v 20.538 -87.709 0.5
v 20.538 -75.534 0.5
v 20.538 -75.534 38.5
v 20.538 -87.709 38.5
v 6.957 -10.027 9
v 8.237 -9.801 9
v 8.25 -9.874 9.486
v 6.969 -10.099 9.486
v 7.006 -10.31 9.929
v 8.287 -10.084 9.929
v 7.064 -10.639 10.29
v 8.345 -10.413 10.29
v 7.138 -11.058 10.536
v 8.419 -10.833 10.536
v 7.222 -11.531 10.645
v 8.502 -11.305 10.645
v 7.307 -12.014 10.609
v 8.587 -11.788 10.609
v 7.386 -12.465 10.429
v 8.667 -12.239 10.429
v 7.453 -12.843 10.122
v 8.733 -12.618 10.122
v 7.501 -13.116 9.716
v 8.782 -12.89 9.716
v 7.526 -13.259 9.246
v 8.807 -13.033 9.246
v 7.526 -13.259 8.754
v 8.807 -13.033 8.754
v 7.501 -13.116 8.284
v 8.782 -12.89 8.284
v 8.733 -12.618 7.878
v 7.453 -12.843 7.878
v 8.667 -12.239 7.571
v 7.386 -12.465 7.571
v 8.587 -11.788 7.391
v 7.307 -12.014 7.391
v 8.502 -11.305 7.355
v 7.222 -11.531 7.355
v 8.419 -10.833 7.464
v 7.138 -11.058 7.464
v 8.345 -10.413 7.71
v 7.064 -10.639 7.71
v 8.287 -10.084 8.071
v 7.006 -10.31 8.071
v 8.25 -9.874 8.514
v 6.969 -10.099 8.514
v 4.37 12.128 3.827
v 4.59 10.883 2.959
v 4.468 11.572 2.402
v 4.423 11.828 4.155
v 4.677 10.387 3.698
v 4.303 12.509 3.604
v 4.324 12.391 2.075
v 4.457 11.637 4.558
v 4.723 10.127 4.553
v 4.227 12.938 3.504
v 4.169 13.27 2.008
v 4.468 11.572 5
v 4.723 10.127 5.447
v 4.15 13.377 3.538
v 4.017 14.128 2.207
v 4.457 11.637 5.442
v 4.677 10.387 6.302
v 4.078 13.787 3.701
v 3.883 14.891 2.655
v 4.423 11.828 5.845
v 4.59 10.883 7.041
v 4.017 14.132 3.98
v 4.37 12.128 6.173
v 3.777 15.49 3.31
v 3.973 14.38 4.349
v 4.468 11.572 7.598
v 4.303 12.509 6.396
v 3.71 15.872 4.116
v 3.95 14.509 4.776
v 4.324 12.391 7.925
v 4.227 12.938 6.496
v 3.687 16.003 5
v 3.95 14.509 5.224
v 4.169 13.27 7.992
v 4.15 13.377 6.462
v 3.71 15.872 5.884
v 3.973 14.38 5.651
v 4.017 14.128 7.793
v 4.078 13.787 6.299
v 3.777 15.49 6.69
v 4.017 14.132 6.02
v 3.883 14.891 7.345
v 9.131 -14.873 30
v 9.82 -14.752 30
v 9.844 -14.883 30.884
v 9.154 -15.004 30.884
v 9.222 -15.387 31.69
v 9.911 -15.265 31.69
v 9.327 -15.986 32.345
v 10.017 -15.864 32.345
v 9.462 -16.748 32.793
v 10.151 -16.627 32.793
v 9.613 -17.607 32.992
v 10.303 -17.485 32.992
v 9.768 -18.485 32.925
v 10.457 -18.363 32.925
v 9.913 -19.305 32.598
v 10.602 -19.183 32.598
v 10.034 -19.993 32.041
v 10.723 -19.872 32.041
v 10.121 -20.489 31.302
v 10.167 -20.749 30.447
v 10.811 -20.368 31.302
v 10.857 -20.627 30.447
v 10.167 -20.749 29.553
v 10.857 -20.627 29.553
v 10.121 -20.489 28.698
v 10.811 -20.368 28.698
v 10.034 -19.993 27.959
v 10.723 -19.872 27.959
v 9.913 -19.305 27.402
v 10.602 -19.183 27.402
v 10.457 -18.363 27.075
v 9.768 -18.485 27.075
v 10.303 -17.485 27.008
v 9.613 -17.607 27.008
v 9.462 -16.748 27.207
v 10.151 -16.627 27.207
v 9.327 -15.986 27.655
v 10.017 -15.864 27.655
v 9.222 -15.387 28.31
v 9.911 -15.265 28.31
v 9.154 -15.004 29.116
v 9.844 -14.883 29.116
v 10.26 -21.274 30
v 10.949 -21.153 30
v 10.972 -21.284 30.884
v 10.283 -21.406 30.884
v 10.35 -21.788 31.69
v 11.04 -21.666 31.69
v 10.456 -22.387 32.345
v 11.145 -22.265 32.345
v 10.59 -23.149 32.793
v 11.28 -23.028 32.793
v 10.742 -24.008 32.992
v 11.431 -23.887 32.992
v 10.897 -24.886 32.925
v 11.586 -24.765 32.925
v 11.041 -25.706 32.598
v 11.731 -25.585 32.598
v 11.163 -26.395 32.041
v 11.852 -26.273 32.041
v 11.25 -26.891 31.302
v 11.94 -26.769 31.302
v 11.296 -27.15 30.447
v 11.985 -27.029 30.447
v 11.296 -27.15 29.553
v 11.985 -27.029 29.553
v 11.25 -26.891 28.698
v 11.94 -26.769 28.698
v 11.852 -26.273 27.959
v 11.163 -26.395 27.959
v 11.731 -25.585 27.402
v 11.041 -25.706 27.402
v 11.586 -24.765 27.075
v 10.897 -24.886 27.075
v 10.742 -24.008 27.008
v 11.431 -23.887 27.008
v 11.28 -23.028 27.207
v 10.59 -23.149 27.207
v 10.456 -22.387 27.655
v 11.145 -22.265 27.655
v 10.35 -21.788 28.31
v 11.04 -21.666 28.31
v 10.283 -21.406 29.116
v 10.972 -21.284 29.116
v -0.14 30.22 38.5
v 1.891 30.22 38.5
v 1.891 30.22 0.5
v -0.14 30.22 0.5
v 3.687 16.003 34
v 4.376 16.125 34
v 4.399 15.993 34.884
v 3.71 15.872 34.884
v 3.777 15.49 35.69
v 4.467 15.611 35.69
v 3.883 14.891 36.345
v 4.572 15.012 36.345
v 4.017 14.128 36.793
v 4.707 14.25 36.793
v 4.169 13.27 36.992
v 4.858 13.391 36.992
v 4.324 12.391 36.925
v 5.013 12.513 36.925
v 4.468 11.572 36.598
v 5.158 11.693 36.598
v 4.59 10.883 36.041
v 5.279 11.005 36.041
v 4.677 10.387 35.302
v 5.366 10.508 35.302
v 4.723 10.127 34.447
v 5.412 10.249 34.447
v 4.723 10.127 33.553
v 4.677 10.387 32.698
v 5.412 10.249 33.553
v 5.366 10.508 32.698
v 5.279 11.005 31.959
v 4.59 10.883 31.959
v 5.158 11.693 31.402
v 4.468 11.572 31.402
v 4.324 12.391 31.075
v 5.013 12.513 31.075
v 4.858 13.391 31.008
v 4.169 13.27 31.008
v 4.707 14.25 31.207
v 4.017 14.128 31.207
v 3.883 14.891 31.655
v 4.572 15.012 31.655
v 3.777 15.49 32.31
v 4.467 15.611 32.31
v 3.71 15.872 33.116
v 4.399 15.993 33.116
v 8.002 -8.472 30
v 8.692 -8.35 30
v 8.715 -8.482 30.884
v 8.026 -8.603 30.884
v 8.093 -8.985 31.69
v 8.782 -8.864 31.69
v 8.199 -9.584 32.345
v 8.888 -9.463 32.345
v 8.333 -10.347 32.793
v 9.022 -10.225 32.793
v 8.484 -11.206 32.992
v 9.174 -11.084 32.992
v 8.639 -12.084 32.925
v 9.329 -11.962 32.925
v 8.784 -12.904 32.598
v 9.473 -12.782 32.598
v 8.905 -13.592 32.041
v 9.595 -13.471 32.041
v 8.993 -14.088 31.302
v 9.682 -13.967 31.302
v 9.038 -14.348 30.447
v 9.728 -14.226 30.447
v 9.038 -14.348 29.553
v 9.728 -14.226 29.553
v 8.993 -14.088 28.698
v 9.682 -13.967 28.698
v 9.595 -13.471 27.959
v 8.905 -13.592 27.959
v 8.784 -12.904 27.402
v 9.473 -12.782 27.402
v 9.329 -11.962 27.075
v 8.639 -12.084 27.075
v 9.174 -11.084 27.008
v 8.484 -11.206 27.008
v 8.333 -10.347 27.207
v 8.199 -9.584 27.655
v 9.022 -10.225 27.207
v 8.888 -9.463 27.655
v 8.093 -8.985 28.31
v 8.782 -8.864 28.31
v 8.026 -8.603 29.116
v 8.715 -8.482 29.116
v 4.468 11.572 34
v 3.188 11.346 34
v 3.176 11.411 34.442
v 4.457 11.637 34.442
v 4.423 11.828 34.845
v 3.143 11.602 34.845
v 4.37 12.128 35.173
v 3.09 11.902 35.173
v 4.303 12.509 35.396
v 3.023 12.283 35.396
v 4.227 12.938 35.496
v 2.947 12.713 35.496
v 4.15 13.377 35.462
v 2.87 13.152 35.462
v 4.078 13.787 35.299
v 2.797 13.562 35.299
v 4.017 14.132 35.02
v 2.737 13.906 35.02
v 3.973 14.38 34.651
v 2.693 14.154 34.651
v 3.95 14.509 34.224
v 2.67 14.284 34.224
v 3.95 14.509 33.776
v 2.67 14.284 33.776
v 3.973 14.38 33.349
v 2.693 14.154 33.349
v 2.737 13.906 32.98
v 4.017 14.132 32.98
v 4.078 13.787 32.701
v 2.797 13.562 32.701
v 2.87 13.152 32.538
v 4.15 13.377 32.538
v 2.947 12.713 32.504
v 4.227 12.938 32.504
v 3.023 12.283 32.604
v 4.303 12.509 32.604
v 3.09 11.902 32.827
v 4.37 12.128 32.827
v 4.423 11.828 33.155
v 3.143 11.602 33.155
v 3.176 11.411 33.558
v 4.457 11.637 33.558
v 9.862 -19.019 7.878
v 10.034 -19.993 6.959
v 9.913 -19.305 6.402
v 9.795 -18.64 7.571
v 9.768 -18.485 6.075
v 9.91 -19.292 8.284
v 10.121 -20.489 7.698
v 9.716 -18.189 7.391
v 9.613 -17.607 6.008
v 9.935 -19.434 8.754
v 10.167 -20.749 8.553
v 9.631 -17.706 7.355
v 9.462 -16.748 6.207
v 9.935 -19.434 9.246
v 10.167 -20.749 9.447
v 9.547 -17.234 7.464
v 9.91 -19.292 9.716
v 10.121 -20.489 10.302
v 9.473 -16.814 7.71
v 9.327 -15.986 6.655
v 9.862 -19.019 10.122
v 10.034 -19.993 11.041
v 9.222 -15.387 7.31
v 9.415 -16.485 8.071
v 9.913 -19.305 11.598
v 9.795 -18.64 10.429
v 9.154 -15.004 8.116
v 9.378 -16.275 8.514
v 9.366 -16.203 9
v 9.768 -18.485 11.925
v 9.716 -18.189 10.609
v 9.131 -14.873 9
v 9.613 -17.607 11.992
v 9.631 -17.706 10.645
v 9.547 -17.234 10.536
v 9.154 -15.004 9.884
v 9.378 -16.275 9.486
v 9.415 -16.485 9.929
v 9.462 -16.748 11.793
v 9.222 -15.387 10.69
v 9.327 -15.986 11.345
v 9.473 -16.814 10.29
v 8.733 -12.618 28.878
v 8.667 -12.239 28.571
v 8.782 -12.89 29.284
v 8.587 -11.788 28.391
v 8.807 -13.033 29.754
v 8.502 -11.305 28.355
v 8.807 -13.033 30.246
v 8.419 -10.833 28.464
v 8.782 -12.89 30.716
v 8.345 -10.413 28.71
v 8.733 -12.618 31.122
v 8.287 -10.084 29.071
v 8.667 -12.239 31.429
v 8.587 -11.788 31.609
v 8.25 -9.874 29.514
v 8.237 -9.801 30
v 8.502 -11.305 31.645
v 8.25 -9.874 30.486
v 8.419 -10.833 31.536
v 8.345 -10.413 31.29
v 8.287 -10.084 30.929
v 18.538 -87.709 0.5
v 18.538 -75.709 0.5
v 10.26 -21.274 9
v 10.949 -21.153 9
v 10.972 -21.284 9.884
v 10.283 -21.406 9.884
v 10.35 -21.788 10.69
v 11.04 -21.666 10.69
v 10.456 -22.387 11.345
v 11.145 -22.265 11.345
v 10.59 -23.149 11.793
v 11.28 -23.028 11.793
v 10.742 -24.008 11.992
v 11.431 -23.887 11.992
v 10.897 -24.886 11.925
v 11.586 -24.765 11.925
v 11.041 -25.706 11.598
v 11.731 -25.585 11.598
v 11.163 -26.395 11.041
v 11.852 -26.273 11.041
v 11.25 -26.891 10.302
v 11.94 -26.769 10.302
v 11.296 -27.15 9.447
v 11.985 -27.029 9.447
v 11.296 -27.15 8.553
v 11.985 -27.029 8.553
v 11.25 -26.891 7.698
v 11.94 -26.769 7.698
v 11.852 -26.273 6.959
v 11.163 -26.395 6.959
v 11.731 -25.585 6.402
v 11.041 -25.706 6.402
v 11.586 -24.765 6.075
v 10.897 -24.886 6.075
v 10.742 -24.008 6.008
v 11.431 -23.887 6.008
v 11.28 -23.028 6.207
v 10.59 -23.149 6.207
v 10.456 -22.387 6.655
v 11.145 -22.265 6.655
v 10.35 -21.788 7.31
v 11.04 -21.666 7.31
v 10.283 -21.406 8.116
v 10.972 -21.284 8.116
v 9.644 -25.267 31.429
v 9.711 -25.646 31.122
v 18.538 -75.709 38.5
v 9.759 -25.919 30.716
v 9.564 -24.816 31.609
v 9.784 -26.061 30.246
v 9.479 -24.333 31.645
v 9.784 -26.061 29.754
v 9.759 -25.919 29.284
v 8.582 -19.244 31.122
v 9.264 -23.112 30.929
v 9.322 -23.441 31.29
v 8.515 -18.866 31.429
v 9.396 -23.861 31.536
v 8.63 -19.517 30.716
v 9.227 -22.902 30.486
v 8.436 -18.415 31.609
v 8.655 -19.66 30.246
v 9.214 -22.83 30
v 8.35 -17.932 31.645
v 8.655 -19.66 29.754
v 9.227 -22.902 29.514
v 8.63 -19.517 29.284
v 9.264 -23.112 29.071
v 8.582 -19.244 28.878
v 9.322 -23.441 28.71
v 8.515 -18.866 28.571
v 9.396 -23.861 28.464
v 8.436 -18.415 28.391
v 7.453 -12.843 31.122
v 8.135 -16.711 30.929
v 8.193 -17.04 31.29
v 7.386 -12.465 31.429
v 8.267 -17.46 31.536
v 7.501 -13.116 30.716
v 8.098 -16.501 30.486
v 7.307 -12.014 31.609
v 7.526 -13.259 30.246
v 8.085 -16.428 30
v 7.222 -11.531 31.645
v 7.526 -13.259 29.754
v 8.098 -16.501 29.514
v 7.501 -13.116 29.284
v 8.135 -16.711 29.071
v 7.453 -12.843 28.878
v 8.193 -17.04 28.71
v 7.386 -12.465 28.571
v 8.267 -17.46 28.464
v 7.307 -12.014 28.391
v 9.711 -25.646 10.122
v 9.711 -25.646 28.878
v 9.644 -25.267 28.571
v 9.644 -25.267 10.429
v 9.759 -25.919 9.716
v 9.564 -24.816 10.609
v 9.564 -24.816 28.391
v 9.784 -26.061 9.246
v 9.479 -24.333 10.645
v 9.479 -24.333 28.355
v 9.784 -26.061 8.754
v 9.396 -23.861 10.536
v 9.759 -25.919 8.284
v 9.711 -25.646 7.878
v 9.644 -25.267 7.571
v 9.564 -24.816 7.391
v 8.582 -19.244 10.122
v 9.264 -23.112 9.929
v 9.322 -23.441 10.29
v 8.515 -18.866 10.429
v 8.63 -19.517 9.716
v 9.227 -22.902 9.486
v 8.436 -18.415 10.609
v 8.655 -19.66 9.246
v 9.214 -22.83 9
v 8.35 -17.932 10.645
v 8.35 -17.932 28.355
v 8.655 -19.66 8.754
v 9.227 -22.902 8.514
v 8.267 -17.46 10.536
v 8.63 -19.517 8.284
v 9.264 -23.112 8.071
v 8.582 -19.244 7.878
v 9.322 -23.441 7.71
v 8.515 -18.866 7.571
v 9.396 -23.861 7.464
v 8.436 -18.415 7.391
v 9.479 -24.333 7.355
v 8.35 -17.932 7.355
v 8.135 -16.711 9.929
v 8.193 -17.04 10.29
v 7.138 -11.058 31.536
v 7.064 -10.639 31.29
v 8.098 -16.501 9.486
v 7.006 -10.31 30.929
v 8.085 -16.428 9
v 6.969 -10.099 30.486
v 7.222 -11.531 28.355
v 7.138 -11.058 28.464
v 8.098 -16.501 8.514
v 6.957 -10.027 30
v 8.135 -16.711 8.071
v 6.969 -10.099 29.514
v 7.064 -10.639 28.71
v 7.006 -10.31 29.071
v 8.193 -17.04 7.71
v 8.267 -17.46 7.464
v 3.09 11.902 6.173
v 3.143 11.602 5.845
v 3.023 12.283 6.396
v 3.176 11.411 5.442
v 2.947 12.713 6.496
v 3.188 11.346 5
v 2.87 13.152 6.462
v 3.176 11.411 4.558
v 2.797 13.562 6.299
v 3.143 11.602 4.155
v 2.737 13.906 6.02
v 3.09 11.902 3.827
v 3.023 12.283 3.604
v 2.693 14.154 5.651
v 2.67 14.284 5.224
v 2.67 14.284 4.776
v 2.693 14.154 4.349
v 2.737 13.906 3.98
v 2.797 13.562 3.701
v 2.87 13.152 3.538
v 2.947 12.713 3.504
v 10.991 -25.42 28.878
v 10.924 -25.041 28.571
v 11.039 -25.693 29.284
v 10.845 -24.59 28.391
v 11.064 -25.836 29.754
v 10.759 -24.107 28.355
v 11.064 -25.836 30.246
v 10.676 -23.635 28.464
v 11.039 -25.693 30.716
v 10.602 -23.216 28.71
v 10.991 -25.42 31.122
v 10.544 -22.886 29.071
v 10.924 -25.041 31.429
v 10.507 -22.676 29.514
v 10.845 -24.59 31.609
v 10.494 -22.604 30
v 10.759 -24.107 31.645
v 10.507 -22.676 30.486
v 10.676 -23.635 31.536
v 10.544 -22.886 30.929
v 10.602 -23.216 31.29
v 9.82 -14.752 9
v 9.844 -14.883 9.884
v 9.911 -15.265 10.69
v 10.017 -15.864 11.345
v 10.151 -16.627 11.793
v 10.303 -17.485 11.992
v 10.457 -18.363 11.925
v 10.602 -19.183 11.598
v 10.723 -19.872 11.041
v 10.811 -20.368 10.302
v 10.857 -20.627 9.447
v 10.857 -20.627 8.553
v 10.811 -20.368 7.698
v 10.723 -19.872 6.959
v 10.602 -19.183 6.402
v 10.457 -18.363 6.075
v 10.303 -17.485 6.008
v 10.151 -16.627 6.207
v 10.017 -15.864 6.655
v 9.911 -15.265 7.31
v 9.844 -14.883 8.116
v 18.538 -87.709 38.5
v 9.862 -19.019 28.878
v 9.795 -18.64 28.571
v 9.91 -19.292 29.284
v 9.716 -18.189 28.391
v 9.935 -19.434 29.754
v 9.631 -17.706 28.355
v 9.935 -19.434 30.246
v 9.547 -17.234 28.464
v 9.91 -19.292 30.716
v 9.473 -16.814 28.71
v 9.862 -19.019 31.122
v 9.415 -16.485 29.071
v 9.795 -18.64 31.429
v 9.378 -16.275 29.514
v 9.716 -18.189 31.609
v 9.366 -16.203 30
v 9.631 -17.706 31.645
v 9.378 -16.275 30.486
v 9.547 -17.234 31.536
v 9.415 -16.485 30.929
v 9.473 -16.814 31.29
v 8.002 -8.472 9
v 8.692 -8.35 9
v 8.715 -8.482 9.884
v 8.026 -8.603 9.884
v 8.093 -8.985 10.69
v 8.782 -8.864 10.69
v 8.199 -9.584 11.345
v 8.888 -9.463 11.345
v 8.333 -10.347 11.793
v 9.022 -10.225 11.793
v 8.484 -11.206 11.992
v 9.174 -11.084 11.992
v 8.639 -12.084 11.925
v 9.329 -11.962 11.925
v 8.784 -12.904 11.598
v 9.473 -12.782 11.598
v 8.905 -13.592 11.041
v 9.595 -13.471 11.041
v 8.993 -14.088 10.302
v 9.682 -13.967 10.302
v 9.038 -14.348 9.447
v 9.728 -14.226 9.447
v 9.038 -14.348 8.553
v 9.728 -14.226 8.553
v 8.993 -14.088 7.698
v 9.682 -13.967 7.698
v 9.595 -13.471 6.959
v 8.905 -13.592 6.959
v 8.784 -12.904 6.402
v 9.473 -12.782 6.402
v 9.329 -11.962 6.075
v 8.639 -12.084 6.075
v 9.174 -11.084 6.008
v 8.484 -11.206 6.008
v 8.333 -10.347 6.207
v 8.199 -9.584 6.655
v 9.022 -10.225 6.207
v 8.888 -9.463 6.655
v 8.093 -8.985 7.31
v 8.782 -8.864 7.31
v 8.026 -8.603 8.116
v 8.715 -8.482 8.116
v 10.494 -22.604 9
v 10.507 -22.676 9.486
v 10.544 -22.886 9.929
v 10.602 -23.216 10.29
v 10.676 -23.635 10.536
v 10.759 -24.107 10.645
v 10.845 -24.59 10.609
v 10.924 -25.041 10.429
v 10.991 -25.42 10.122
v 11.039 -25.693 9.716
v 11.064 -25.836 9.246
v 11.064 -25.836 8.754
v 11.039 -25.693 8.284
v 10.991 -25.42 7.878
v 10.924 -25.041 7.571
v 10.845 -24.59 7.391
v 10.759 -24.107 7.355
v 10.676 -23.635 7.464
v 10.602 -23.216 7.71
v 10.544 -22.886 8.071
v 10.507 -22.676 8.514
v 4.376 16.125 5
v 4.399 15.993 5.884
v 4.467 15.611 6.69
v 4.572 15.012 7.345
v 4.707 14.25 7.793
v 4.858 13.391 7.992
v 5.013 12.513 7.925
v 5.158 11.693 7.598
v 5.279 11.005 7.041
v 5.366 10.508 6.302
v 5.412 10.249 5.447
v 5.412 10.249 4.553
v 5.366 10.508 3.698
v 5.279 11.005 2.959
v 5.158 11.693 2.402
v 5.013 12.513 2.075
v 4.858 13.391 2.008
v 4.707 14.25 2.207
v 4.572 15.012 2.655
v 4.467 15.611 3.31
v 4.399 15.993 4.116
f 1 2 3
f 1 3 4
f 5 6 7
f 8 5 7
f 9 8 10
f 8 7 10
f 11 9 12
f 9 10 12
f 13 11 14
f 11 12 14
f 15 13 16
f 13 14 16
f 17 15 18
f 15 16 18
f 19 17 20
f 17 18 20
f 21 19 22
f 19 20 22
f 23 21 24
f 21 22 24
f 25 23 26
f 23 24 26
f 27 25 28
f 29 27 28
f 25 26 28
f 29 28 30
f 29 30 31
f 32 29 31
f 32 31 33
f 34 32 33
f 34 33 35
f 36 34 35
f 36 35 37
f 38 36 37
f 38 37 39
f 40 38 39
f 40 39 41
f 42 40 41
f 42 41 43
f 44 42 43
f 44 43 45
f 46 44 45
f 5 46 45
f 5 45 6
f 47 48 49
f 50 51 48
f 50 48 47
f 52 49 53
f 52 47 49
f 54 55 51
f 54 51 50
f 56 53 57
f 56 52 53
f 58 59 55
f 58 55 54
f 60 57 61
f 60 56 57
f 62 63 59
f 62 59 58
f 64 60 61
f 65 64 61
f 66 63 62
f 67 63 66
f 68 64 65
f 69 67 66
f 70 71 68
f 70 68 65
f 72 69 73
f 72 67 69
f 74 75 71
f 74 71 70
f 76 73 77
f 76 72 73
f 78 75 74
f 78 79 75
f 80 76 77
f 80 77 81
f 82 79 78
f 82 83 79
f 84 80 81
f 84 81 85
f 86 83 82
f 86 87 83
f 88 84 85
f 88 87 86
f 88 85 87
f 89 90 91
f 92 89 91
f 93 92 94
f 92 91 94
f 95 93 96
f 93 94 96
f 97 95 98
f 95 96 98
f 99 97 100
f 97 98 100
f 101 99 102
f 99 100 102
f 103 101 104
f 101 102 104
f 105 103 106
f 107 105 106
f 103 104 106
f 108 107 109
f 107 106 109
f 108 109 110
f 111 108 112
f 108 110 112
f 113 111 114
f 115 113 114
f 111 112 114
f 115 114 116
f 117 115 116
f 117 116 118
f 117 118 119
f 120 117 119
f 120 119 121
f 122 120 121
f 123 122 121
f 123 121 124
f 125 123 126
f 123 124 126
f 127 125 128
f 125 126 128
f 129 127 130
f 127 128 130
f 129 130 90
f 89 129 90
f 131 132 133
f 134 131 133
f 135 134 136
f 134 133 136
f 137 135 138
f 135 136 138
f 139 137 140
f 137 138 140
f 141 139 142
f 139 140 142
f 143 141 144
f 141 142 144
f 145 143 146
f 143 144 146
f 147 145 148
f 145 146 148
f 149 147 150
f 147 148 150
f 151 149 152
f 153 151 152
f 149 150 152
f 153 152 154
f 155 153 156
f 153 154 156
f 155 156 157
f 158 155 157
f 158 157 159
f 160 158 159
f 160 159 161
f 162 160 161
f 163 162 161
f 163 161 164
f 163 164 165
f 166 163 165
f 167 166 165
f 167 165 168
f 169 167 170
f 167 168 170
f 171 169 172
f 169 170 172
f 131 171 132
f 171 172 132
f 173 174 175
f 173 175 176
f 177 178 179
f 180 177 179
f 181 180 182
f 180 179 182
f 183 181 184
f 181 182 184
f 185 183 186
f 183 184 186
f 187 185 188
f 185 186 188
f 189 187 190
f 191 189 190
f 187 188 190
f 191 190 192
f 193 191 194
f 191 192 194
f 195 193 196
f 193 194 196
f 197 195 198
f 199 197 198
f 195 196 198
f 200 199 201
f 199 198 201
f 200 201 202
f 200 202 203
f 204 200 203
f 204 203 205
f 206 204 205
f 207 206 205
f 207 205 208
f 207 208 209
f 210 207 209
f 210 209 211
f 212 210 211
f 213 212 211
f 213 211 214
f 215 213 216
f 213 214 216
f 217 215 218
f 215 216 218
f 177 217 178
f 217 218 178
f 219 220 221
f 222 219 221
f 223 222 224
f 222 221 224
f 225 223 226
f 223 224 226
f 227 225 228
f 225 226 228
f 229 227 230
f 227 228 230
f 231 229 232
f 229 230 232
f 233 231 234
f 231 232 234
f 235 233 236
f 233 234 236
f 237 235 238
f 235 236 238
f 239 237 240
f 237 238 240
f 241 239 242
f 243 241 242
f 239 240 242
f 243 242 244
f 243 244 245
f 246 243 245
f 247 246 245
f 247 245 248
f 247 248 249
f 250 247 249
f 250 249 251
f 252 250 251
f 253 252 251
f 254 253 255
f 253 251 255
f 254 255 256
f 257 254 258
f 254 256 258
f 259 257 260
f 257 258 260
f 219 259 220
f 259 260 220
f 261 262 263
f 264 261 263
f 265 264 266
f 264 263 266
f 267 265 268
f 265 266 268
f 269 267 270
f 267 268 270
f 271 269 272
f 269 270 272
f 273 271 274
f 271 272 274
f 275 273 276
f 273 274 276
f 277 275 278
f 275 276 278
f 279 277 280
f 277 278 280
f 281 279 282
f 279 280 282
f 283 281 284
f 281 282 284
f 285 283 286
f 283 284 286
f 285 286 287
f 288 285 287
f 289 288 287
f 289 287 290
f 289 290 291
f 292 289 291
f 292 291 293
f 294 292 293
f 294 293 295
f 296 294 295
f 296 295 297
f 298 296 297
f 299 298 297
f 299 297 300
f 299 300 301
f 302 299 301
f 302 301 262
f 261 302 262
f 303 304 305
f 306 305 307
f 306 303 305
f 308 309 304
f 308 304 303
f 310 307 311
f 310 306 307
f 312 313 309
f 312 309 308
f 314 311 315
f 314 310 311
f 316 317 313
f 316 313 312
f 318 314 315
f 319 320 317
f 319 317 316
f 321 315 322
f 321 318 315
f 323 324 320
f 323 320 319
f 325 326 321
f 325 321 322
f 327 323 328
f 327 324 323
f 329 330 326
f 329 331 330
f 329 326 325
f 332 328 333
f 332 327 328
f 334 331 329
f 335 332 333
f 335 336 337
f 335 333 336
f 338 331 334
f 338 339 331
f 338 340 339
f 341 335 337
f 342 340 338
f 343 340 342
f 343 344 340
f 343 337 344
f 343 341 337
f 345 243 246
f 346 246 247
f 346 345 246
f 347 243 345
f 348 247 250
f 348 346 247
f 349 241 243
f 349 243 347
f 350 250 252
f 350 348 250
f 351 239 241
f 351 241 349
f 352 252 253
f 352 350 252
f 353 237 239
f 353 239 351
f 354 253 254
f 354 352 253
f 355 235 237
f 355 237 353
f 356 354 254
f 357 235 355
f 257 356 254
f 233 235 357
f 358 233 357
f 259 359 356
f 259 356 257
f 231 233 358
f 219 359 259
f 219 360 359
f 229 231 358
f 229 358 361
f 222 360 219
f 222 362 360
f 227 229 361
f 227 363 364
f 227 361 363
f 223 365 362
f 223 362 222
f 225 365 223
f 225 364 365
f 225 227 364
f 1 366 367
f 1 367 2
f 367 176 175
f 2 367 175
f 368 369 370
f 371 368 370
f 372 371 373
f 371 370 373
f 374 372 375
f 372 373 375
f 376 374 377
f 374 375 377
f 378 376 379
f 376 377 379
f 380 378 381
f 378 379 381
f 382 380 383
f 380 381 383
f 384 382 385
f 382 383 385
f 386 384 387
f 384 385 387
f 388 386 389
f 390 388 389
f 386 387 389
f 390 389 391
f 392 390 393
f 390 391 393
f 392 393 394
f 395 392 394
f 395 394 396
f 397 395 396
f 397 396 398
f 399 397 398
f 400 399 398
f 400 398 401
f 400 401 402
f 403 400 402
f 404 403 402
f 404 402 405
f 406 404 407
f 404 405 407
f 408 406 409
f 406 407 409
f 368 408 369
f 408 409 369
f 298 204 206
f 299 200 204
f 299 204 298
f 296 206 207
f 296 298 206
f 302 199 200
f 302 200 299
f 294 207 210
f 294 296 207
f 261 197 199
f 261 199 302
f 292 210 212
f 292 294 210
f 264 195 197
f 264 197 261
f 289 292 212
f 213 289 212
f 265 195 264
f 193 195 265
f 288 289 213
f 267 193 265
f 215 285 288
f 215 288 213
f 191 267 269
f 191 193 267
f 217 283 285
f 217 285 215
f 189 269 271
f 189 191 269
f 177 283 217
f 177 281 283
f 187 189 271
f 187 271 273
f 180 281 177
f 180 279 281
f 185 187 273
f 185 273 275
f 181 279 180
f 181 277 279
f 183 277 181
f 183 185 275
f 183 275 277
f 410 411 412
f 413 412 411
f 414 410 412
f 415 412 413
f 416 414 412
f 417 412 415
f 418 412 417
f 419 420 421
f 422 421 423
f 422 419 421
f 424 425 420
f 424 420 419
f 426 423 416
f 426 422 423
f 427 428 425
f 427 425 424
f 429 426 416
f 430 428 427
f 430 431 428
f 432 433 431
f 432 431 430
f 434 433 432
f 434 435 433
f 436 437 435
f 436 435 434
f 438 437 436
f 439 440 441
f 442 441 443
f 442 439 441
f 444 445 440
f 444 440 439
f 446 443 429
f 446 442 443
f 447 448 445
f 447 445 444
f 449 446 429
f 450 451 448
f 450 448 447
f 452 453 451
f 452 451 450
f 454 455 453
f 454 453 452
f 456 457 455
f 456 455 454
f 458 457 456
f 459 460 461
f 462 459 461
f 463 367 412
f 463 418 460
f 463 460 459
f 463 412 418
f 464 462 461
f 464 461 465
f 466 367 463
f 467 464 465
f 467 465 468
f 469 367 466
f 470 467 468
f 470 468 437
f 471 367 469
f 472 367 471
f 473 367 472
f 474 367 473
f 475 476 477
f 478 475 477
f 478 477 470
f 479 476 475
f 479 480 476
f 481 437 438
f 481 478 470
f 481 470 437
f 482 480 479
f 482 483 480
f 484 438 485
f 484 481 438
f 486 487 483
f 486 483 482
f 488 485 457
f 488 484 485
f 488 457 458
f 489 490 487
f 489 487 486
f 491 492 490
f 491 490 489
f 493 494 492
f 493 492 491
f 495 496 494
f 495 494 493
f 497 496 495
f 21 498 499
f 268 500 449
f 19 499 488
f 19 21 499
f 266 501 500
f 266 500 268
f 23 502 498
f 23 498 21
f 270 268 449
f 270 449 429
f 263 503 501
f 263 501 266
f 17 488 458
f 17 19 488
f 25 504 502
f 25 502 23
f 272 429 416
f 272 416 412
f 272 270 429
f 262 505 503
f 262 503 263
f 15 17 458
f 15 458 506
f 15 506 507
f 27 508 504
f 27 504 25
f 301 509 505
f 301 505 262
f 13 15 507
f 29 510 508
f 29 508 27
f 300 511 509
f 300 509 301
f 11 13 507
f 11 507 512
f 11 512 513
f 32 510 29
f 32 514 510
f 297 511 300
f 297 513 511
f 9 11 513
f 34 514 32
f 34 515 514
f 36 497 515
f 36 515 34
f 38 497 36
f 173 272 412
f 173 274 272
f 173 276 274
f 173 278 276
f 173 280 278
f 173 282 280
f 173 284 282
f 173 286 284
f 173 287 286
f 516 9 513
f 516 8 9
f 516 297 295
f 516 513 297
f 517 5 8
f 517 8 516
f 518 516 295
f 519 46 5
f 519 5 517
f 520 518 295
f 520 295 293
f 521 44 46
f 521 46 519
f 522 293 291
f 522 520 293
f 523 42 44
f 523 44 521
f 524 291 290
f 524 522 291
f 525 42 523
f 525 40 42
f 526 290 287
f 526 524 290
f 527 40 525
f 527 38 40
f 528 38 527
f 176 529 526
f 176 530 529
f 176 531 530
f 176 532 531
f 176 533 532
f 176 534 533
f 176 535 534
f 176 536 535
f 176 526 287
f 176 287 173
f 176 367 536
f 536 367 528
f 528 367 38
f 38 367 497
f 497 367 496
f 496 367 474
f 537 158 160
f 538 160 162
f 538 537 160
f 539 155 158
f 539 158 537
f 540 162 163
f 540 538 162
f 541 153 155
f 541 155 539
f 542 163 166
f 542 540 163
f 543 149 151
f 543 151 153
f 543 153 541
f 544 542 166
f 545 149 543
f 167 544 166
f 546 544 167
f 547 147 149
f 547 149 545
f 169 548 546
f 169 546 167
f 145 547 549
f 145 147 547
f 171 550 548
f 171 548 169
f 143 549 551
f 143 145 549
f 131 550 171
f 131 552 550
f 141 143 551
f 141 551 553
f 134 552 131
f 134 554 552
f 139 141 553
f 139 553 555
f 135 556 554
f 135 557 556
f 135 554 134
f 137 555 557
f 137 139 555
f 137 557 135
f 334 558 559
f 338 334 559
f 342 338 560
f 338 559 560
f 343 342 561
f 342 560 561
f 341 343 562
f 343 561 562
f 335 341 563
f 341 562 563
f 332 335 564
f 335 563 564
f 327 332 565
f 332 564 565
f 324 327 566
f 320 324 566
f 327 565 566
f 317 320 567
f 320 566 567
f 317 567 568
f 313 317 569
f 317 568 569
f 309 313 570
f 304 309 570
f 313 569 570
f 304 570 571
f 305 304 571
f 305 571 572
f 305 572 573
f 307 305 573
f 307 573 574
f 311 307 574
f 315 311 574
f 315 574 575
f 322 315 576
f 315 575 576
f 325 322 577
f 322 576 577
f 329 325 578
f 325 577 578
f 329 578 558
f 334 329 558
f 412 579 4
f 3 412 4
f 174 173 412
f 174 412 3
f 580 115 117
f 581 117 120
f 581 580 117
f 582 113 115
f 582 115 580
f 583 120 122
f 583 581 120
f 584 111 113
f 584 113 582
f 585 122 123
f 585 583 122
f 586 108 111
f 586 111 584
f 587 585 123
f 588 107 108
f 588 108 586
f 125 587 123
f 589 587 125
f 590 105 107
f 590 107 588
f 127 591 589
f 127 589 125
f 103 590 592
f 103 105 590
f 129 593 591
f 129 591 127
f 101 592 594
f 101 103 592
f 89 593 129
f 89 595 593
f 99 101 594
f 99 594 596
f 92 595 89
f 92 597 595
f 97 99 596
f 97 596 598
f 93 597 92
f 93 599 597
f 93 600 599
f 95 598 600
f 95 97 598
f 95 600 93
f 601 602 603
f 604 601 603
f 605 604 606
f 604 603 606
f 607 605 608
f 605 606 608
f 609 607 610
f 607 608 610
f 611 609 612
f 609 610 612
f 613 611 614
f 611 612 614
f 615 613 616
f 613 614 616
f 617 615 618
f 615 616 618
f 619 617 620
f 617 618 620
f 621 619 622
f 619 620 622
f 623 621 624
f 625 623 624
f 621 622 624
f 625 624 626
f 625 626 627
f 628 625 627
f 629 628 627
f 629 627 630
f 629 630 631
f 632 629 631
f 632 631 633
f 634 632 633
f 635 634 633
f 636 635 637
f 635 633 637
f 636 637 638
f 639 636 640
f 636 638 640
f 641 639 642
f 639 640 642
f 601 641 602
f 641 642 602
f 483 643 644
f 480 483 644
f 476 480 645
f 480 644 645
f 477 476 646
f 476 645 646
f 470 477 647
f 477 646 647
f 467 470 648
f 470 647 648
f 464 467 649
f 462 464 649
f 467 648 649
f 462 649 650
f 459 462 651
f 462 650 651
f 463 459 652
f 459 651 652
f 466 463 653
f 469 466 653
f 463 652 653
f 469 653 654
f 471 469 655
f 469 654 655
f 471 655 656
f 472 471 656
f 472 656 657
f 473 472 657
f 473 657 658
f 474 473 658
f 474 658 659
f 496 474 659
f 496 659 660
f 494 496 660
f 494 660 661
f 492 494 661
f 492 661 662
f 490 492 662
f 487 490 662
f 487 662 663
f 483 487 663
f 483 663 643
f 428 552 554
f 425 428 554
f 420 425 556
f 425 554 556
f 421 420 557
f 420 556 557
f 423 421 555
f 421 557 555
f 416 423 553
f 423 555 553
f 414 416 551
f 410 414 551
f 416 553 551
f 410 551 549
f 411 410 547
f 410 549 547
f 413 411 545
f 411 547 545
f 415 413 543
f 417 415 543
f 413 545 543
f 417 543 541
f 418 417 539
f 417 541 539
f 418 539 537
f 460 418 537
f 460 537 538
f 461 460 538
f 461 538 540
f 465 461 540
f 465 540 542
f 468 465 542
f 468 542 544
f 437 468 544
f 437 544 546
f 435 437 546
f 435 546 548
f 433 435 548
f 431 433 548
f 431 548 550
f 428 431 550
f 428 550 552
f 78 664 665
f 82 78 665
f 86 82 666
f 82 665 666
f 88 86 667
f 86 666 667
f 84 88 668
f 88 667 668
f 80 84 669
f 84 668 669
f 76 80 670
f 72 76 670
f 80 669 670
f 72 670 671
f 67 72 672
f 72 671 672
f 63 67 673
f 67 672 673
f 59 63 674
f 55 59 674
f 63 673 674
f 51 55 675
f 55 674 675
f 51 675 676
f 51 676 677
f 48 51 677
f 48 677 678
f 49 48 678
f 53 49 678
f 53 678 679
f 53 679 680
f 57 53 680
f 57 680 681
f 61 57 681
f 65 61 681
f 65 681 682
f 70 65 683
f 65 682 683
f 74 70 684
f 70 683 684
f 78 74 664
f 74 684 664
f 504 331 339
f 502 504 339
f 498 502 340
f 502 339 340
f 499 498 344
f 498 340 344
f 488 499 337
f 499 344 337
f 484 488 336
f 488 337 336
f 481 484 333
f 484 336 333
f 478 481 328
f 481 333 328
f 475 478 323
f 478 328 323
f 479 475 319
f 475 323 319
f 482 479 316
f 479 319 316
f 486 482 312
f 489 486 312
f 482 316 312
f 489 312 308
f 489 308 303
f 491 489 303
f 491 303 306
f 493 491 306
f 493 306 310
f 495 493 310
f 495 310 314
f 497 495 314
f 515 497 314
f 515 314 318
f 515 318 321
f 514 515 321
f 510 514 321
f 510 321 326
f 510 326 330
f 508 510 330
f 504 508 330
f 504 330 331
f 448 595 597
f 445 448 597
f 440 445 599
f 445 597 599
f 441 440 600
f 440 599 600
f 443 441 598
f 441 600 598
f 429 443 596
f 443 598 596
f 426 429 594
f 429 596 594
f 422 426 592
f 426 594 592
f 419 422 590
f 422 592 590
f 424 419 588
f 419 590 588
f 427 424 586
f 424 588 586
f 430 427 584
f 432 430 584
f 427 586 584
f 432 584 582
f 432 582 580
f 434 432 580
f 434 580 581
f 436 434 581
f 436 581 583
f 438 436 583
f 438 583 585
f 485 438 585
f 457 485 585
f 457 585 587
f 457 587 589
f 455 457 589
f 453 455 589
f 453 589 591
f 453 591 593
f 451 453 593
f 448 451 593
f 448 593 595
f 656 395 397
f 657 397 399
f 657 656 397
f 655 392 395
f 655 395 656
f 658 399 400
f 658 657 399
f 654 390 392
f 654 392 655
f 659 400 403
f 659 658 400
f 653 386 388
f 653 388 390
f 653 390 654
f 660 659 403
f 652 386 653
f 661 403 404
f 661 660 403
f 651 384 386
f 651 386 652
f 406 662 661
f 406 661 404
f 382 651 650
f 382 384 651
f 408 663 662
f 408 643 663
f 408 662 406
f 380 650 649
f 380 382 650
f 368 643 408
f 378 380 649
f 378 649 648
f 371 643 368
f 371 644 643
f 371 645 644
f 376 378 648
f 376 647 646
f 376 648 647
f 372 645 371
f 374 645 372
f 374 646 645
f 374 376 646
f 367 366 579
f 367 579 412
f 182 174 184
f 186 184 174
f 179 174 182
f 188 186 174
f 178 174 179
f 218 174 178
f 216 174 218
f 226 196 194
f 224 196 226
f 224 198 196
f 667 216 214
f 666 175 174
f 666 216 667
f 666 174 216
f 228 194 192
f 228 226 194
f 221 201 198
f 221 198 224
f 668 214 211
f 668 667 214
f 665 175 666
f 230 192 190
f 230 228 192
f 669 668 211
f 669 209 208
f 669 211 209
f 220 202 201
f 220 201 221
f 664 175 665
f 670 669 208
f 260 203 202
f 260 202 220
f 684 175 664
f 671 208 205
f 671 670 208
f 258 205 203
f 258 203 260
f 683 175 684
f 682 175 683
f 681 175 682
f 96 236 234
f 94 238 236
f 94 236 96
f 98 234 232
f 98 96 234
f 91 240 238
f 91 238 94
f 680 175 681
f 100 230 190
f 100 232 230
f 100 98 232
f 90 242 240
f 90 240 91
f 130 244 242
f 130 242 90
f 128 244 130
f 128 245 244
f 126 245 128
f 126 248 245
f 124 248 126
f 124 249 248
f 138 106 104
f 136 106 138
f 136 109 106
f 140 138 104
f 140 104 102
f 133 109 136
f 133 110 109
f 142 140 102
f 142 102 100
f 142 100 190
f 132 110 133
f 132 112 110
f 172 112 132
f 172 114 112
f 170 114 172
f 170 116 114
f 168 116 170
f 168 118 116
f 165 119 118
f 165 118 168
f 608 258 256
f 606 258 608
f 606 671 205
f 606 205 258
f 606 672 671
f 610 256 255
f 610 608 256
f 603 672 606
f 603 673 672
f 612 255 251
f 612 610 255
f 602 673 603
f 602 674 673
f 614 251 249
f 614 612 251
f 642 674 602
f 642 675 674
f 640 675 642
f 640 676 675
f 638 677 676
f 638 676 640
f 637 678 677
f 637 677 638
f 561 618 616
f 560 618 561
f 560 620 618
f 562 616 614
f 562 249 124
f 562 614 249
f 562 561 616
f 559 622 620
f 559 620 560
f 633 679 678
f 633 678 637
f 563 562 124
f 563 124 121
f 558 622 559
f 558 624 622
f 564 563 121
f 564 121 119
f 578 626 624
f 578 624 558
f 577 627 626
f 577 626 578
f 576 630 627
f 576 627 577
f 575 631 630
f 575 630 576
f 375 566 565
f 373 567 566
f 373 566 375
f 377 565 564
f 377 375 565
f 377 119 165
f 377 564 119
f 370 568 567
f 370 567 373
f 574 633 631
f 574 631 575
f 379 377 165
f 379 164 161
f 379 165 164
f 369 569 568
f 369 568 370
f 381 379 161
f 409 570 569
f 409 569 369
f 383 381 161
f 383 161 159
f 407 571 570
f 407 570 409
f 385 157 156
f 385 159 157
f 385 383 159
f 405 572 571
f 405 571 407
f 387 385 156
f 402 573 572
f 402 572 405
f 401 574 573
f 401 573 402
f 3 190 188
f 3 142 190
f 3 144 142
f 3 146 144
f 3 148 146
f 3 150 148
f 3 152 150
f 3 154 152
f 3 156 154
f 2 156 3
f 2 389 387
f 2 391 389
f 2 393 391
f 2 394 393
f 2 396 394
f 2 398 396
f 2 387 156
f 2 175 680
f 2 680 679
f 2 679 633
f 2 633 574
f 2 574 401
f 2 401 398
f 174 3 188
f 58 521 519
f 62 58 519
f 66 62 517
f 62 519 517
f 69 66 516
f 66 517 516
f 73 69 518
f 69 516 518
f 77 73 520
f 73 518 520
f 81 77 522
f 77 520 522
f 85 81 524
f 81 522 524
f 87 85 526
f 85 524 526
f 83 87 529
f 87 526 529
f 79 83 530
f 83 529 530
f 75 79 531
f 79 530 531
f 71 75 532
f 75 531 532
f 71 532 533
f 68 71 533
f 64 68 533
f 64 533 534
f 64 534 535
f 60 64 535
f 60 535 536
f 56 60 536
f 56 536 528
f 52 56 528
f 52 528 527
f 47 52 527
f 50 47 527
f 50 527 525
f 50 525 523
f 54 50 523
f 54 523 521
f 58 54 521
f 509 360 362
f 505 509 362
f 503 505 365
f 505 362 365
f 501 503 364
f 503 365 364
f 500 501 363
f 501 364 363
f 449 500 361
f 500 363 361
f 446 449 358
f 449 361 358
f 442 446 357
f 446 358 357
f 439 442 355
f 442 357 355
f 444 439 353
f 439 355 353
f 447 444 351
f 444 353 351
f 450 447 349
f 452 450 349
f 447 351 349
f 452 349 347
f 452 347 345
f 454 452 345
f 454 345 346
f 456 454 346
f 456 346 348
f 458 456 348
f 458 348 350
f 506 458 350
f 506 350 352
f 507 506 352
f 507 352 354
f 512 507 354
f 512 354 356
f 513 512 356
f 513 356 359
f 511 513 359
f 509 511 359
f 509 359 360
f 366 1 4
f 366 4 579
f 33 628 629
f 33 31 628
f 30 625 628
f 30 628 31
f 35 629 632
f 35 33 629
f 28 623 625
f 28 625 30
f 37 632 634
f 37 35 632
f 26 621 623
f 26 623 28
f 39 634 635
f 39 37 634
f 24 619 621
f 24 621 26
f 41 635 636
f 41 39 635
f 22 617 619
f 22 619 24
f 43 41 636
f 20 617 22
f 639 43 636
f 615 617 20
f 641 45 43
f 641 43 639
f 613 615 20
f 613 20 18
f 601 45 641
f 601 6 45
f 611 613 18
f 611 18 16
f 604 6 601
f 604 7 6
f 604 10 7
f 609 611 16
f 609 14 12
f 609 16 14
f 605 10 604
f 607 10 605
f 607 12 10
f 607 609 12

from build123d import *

# Parameters (mm, degrees)
EXTRUDE_1_DEPTH     = 39
SKETCH_7_R          = 1.65
CUT_EXTRUDE_1_DEPTH = 10
SKETCH_11_R         = 1.5
CUT_EXTRUDE_2_DEPTH = 10
SKETCH_12_W         = 29.009042243
SKETCH_12_H         = 10
CUT_EXTRUDE_3_DEPTH = 40
SKETCH_14_R         = 3
CUT_EXTRUDE_4_DEPTH = 0.7
SKETCH_17_W         = 22.396032982
SKETCH_17_H         = 19.376343142
CUT_EXTRUDE_5_DEPTH = 48
SKETCH_18_W         = 48.955276493
SKETCH_18_H         = 0.5
SKETCH_18_W_2       = 40.156862745
CUT_EXTRUDE_6_DEPTH = 150


with BuildPart() as part:
    # 草图1 → 凸台-拉伸1 (new body)
    with BuildSketch(Plane.XY):
        Polygon((18.538024786, -87.708726548), (18.538024786, -75.708726548), (-3.150193841, 47.291273452), (-1.119340617, 47.291273452), (20.538024786, -75.533749221), (20.538024786, -87.708726548), align=None)
    extrude(amount=EXTRUDE_1_DEPTH)

    # 草图7 → 切除-拉伸1 (cut)
    with BuildSketch(Plane(origin=(7.001695694, 1.234587862, 0), x_dir=(0, 0, -1), z_dir=(0.9848077530122079, 0.17364817766693164, 0))):
        with Locations(Location((-30, -19.232815796, 0), (0, 0, 90))):
            Circle(SKETCH_7_R)
        with Locations(Location((-9, -19.232815796, 0), (0, 0, 90))):
            Circle(SKETCH_7_R)
        with Locations(Location((-30, -12.732815796, 0), (0, 0, 90))):
            Circle(SKETCH_7_R)
        with Locations(Location((-9, -12.732815796, 0), (0, 0, 90))):
            Circle(SKETCH_7_R)
        with Locations(Location((-9, -25.732815796, 0), (0, 0, 90))):
            Circle(SKETCH_7_R)
        with Locations(Location((-30, -25.732815796, 0), (0, 0, 90))):
            Circle(SKETCH_7_R)
    extrude(amount=-CUT_EXTRUDE_1_DEPTH, mode=Mode.SUBTRACT)

    # 草图11 → 切除-拉伸2 (cut)
    with BuildSketch(Plane(origin=(5.032080188, 0.887291506, 0), x_dir=(0, 0, 1), z_dir=(-0.9848077530122079, -0.1736481776669316, 0))):
        with Locations(Location((5, 12.119838165, 0), (0, 0, 270))):
            Circle(SKETCH_11_R)
        with Locations(Location((34, 12.119838165, 0), (0, 0, 270))):
            Circle(SKETCH_11_R)
    extrude(amount=-CUT_EXTRUDE_2_DEPTH, mode=Mode.SUBTRACT)

    # 草图12 → 切除-拉伸3 (cut)
    with BuildSketch(Plane.XY.offset(39)):
        with Locations((0.338832517, 47.079233545)):
            Rectangle(SKETCH_12_W, SKETCH_12_H)
    extrude(amount=-CUT_EXTRUDE_3_DEPTH, mode=Mode.SUBTRACT)

    # 草图14 → 切除-拉伸4 (cut)
    with BuildSketch(Plane(origin=(7.001695694, 1.234587862, 0), x_dir=(0, 0, -1), z_dir=(0.9848077530122078, 0.17364817766693164, 0))):
        with Locations(Location((-34, 12.119838165, 0), (0, 0, 90))):
            Circle(SKETCH_14_R)
        with Locations(Location((-5, 12.119838165, 0), (0, 0, 90))):
            Circle(SKETCH_14_R)
        with Locations(Location((-30, -19.232815796, 0), (0, 0, 90))):
            Circle(SKETCH_14_R)
        with Locations(Location((-9, -19.232815796, 0), (0, 0, 90))):
            Circle(SKETCH_14_R)
        with Locations(Location((-30, -12.732815796, 0), (0, 0, 90))):
            Circle(SKETCH_14_R)
        with Locations(Location((-9, -12.732815796, 0), (0, 0, 90))):
            Circle(SKETCH_14_R)
        with Locations(Location((-30, -25.732815796, 0), (0, 0, 90))):
            Circle(SKETCH_14_R)
        with Locations(Location((-9, -25.732815796, 0), (0, 0, 90))):
            Circle(SKETCH_14_R)
    extrude(amount=-CUT_EXTRUDE_4_DEPTH, mode=Mode.SUBTRACT)

    # 草图17 → 切除-拉伸5 (cut)
    with BuildSketch(Plane(origin=(0, 0, 0), x_dir=(-1, 0, 0), z_dir=(0, 0, -1))):
        with Locations((2.347013145, 39.90800246)):
            Rectangle(SKETCH_17_W, SKETCH_17_H)
    extrude(amount=-CUT_EXTRUDE_5_DEPTH, mode=Mode.SUBTRACT)

    # 草图18 → 切除-拉伸6 (cut)
    with BuildSketch(Plane(origin=(0, 30.219830889, 0), x_dir=(1, 0, 0), z_dir=(0, 1, 0))):
        with Locations((4.107783916, -0.25)):
            Rectangle(SKETCH_18_W, SKETCH_18_H)
        with Locations((8.50699079, -38.75)):
            Rectangle(SKETCH_18_W_2, SKETCH_18_H)
    extrude(amount=-CUT_EXTRUDE_6_DEPTH, mode=Mode.SUBTRACT)


solid = part.part
